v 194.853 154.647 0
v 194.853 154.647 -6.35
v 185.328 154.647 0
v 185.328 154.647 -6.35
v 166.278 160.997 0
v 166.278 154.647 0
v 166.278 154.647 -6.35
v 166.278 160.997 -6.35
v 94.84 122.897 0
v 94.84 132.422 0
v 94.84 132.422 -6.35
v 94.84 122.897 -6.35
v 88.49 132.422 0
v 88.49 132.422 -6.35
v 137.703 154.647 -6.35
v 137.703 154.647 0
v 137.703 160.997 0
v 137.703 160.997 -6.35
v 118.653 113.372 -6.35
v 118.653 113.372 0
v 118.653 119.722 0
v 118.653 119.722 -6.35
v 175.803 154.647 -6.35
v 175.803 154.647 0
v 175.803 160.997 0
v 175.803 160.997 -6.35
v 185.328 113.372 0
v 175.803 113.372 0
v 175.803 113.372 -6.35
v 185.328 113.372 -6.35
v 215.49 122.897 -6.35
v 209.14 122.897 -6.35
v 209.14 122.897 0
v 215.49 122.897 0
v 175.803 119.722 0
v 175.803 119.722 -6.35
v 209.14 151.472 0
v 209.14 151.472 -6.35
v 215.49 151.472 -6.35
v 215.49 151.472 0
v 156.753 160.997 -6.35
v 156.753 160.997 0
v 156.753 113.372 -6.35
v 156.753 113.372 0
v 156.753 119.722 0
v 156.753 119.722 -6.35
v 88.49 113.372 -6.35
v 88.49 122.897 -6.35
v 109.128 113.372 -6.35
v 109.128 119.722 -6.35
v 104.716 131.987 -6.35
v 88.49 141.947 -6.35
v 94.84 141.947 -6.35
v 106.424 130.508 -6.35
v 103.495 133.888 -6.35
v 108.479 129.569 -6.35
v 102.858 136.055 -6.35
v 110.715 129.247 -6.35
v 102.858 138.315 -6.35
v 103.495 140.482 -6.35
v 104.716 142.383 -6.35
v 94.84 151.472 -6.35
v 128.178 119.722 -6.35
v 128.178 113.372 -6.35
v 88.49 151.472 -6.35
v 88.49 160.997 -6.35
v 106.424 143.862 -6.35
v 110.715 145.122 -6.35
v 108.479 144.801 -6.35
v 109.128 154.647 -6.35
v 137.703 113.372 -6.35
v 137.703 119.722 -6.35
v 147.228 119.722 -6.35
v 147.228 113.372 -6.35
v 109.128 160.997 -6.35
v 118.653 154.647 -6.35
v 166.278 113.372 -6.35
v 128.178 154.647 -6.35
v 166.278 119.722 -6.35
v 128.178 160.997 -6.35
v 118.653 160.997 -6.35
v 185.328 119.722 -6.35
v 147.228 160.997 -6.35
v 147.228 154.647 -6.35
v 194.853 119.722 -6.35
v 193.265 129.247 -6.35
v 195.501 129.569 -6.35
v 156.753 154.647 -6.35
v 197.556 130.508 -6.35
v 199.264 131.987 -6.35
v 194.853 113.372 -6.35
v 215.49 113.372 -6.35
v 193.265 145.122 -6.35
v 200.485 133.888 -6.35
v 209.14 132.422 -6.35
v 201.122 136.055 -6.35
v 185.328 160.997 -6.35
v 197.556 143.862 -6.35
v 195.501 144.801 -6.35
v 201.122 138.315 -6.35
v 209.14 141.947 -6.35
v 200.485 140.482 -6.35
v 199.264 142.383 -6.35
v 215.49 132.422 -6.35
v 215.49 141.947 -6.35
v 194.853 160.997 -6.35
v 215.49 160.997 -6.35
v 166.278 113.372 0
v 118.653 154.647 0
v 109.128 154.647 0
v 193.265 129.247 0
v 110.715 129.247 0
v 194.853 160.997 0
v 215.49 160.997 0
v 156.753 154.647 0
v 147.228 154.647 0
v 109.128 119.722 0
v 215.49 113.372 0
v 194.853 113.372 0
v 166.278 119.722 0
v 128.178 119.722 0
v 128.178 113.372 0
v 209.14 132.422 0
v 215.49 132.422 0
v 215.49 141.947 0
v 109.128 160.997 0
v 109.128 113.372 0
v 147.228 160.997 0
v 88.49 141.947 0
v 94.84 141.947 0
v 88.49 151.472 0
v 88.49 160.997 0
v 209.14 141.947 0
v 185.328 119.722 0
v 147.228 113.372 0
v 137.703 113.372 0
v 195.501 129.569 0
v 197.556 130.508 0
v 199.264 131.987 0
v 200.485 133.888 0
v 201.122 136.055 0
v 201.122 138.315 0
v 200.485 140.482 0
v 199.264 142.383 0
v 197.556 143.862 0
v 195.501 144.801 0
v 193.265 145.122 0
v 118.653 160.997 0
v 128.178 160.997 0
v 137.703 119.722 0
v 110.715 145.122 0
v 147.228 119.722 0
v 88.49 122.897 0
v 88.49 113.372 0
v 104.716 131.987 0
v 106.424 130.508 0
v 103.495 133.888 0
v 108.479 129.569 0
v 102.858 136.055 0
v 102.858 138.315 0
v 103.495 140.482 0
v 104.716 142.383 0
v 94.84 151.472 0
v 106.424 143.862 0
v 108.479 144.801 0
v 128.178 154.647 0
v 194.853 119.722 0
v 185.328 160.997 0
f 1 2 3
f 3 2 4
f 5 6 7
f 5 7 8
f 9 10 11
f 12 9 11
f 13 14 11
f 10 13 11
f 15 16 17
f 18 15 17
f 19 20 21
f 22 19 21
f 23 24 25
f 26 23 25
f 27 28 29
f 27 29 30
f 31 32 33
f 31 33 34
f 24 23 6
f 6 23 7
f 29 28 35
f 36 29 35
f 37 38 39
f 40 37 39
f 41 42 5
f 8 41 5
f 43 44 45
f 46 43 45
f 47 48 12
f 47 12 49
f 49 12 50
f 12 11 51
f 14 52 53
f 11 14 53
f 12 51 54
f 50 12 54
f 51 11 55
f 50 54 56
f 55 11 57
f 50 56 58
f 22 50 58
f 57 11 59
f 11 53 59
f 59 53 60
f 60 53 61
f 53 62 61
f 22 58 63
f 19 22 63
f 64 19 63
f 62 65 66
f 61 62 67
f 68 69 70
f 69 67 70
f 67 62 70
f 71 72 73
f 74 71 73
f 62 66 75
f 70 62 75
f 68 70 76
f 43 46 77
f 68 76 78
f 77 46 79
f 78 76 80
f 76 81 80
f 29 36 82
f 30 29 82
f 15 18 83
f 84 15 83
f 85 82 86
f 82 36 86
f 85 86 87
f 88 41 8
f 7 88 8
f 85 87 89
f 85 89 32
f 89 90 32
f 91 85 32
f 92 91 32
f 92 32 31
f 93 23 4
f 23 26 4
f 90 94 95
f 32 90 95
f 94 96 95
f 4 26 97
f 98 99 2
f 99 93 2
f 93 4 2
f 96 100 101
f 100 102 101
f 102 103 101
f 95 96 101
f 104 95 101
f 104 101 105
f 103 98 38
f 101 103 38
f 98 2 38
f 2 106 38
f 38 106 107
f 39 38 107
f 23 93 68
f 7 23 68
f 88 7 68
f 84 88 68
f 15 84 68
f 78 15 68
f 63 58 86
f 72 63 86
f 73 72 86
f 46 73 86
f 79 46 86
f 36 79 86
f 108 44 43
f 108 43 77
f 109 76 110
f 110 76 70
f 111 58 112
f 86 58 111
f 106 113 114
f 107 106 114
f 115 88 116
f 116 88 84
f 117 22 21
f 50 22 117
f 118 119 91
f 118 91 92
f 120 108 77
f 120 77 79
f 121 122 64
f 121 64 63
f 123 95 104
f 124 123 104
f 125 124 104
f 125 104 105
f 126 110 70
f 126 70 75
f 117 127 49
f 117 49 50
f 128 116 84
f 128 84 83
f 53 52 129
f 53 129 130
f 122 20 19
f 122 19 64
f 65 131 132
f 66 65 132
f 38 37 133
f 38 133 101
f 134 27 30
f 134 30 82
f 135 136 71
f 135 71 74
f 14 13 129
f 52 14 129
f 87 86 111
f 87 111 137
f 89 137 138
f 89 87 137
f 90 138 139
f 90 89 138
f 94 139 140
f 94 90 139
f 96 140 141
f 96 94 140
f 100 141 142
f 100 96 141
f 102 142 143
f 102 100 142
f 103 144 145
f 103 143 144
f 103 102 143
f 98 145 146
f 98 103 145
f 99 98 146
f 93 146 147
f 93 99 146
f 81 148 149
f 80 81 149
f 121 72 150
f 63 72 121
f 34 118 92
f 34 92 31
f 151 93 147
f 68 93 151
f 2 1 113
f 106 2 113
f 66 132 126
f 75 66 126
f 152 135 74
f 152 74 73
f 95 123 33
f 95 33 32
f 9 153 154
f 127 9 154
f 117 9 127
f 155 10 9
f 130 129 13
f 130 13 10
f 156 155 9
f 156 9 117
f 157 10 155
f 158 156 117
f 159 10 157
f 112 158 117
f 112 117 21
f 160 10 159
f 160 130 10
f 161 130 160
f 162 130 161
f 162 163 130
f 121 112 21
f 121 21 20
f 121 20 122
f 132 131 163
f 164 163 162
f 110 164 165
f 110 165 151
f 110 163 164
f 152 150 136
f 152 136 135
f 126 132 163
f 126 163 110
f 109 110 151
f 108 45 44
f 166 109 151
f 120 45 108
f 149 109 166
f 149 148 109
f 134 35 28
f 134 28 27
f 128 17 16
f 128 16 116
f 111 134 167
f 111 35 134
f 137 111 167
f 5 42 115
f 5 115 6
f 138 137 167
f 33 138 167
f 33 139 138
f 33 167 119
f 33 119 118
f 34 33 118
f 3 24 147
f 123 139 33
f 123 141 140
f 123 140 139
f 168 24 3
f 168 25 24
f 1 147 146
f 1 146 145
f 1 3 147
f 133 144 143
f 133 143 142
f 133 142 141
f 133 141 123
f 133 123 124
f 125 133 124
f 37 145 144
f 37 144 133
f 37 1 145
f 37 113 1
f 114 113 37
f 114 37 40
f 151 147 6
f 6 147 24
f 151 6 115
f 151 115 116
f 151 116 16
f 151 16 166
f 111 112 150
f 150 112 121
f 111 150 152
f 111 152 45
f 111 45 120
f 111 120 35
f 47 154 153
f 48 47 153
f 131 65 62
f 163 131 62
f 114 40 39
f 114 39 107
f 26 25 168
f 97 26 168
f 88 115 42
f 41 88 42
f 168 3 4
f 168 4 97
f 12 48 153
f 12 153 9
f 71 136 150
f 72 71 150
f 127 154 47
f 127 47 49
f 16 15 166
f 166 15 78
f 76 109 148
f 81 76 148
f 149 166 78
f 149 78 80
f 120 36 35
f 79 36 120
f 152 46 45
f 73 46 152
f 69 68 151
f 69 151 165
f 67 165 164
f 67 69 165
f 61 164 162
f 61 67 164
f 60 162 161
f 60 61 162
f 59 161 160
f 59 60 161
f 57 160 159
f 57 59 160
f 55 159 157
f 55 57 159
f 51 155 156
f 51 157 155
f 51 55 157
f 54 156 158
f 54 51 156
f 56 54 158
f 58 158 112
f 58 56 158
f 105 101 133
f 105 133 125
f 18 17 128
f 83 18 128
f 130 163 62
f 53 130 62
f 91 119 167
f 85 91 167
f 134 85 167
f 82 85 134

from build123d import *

# Parameters (mm, degrees)
SKETCH1_W           = 127
SKETCH1_H           = 47.625
BOSS_EXTRUDE1_DEPTH = 6.35
SKETCH2_W           = 9.525
SKETCH2_H           = 12.7
CUT_EXTRUDE1_DEPTH  = 270.065952098
LPATTERN1_COUNT     = 3
LPATTERN1_PITCH     = 19.05
LPATTERN1_COL_COUNT = 3
LPATTERN1_COL_PITCH = 19.05
CUT_EXTRUDE3_DEPTH  = 270.065952098
CAVITY1_START       = 122.897475598
CAVITY1_OUTLINE_W   = 6.35
CAVITY1_OUTLINE_H   = 6.35
CAVITY1_DEPTH       = 9.525
CAVITY1_START_2     = 141.947475598
CAVITY1_2_OUTLINE_W = 6.35
CAVITY1_2_OUTLINE_H = 6.35
CAVITY1_2_DEPTH     = 9.525


# Read off the part's stored shape, not the designer's step: Cavity1
with BuildPart() as part:
    # Sketch1 → Boss-Extrude1 (new body)
    with BuildSketch(Plane.XY):
        with Locations((151.990085455, 137.184975598)):
            Rectangle(SKETCH1_W, SKETCH1_H)
    extrude(amount=-BOSS_EXTRUDE1_DEPTH)

    # Sketch2 → Cut-Extrude1 (cut, through all)
    with BuildSketch(Plane(origin=(0, 0, -6.35), x_dir=(-1, 0, 0), z_dir=(0, 0, -1))):
        with Locations((-151.990085455, 160.997475598)):
            Rectangle(SKETCH2_W, SKETCH2_H)
        with Locations((-151.990085455, 113.372475598)):
            Rectangle(SKETCH2_W, SKETCH2_H)
    cut_extrude1 = extrude(amount=-CUT_EXTRUDE1_DEPTH, mode=Mode.SUBTRACT)

    # LPattern1: Cut-Extrude1 ×3
    with Locations(*[(-i * LPATTERN1_PITCH, 0, 0) for i in range(1, LPATTERN1_COUNT)]):
        add(cut_extrude1, mode=Mode.SUBTRACT)

    # LPattern1 col: Cut-Extrude1 ×3
    with Locations(*[(i * LPATTERN1_COL_PITCH, 0, 0) for i in range(1, LPATTERN1_COL_COUNT)]):
        add(cut_extrude1, mode=Mode.SUBTRACT)

    # Sketch3 → Cut-Extrude3 (cut, through all)
    with BuildSketch(Plane(origin=(0, 0, -6.35), x_dir=(-1, 0, 0), z_dir=(0, 0, -1))):
        with BuildLine():
            Line((-193.265085455, 145.122475598), (-110.715085455, 145.122475598))
            ThreePointArc((-110.715085455, 145.122475598), (-102.777585455, 137.184975598), (-110.715085455, 129.247475598))
            Line((-110.715085455, 129.247475598), (-193.265085455, 129.247475598))
            ThreePointArc((-193.265085455, 129.247475598), (-201.202585455, 137.184975598), (-193.265085455, 145.122475598))
        make_face()
    extrude(amount=-CUT_EXTRUDE3_DEPTH, mode=Mode.SUBTRACT)

    # Cavity1 outline → Cavity1 (cut)
    with BuildSketch(Plane(origin=(0, 0, 0), x_dir=(1, 0, 0), z_dir=(0, 1, 0)).offset(CAVITY1_START)):
        with Locations((91.665085455, 3.175)):
            Rectangle(CAVITY1_OUTLINE_W, CAVITY1_OUTLINE_H)
        with Locations((212.315085455, 3.175)):
            Rectangle(CAVITY1_OUTLINE_W, CAVITY1_OUTLINE_H)
    extrude(amount=CAVITY1_DEPTH, mode=Mode.SUBTRACT)

    # Cavity1 2 outline → Cavity1 2 (cut)
    with BuildSketch(Plane(origin=(0, 0, 0), x_dir=(1, 0, 0), z_dir=(0, 1, 0)).offset(CAVITY1_START_2)):
        with Locations((91.665085455, 3.175)):
            Rectangle(CAVITY1_2_OUTLINE_W, CAVITY1_2_OUTLINE_H)
        with Locations((212.315085455, 3.175)):
            Rectangle(CAVITY1_2_OUTLINE_W, CAVITY1_2_OUTLINE_H)
    extrude(amount=CAVITY1_2_DEPTH, mode=Mode.SUBTRACT)


solid = part.part
